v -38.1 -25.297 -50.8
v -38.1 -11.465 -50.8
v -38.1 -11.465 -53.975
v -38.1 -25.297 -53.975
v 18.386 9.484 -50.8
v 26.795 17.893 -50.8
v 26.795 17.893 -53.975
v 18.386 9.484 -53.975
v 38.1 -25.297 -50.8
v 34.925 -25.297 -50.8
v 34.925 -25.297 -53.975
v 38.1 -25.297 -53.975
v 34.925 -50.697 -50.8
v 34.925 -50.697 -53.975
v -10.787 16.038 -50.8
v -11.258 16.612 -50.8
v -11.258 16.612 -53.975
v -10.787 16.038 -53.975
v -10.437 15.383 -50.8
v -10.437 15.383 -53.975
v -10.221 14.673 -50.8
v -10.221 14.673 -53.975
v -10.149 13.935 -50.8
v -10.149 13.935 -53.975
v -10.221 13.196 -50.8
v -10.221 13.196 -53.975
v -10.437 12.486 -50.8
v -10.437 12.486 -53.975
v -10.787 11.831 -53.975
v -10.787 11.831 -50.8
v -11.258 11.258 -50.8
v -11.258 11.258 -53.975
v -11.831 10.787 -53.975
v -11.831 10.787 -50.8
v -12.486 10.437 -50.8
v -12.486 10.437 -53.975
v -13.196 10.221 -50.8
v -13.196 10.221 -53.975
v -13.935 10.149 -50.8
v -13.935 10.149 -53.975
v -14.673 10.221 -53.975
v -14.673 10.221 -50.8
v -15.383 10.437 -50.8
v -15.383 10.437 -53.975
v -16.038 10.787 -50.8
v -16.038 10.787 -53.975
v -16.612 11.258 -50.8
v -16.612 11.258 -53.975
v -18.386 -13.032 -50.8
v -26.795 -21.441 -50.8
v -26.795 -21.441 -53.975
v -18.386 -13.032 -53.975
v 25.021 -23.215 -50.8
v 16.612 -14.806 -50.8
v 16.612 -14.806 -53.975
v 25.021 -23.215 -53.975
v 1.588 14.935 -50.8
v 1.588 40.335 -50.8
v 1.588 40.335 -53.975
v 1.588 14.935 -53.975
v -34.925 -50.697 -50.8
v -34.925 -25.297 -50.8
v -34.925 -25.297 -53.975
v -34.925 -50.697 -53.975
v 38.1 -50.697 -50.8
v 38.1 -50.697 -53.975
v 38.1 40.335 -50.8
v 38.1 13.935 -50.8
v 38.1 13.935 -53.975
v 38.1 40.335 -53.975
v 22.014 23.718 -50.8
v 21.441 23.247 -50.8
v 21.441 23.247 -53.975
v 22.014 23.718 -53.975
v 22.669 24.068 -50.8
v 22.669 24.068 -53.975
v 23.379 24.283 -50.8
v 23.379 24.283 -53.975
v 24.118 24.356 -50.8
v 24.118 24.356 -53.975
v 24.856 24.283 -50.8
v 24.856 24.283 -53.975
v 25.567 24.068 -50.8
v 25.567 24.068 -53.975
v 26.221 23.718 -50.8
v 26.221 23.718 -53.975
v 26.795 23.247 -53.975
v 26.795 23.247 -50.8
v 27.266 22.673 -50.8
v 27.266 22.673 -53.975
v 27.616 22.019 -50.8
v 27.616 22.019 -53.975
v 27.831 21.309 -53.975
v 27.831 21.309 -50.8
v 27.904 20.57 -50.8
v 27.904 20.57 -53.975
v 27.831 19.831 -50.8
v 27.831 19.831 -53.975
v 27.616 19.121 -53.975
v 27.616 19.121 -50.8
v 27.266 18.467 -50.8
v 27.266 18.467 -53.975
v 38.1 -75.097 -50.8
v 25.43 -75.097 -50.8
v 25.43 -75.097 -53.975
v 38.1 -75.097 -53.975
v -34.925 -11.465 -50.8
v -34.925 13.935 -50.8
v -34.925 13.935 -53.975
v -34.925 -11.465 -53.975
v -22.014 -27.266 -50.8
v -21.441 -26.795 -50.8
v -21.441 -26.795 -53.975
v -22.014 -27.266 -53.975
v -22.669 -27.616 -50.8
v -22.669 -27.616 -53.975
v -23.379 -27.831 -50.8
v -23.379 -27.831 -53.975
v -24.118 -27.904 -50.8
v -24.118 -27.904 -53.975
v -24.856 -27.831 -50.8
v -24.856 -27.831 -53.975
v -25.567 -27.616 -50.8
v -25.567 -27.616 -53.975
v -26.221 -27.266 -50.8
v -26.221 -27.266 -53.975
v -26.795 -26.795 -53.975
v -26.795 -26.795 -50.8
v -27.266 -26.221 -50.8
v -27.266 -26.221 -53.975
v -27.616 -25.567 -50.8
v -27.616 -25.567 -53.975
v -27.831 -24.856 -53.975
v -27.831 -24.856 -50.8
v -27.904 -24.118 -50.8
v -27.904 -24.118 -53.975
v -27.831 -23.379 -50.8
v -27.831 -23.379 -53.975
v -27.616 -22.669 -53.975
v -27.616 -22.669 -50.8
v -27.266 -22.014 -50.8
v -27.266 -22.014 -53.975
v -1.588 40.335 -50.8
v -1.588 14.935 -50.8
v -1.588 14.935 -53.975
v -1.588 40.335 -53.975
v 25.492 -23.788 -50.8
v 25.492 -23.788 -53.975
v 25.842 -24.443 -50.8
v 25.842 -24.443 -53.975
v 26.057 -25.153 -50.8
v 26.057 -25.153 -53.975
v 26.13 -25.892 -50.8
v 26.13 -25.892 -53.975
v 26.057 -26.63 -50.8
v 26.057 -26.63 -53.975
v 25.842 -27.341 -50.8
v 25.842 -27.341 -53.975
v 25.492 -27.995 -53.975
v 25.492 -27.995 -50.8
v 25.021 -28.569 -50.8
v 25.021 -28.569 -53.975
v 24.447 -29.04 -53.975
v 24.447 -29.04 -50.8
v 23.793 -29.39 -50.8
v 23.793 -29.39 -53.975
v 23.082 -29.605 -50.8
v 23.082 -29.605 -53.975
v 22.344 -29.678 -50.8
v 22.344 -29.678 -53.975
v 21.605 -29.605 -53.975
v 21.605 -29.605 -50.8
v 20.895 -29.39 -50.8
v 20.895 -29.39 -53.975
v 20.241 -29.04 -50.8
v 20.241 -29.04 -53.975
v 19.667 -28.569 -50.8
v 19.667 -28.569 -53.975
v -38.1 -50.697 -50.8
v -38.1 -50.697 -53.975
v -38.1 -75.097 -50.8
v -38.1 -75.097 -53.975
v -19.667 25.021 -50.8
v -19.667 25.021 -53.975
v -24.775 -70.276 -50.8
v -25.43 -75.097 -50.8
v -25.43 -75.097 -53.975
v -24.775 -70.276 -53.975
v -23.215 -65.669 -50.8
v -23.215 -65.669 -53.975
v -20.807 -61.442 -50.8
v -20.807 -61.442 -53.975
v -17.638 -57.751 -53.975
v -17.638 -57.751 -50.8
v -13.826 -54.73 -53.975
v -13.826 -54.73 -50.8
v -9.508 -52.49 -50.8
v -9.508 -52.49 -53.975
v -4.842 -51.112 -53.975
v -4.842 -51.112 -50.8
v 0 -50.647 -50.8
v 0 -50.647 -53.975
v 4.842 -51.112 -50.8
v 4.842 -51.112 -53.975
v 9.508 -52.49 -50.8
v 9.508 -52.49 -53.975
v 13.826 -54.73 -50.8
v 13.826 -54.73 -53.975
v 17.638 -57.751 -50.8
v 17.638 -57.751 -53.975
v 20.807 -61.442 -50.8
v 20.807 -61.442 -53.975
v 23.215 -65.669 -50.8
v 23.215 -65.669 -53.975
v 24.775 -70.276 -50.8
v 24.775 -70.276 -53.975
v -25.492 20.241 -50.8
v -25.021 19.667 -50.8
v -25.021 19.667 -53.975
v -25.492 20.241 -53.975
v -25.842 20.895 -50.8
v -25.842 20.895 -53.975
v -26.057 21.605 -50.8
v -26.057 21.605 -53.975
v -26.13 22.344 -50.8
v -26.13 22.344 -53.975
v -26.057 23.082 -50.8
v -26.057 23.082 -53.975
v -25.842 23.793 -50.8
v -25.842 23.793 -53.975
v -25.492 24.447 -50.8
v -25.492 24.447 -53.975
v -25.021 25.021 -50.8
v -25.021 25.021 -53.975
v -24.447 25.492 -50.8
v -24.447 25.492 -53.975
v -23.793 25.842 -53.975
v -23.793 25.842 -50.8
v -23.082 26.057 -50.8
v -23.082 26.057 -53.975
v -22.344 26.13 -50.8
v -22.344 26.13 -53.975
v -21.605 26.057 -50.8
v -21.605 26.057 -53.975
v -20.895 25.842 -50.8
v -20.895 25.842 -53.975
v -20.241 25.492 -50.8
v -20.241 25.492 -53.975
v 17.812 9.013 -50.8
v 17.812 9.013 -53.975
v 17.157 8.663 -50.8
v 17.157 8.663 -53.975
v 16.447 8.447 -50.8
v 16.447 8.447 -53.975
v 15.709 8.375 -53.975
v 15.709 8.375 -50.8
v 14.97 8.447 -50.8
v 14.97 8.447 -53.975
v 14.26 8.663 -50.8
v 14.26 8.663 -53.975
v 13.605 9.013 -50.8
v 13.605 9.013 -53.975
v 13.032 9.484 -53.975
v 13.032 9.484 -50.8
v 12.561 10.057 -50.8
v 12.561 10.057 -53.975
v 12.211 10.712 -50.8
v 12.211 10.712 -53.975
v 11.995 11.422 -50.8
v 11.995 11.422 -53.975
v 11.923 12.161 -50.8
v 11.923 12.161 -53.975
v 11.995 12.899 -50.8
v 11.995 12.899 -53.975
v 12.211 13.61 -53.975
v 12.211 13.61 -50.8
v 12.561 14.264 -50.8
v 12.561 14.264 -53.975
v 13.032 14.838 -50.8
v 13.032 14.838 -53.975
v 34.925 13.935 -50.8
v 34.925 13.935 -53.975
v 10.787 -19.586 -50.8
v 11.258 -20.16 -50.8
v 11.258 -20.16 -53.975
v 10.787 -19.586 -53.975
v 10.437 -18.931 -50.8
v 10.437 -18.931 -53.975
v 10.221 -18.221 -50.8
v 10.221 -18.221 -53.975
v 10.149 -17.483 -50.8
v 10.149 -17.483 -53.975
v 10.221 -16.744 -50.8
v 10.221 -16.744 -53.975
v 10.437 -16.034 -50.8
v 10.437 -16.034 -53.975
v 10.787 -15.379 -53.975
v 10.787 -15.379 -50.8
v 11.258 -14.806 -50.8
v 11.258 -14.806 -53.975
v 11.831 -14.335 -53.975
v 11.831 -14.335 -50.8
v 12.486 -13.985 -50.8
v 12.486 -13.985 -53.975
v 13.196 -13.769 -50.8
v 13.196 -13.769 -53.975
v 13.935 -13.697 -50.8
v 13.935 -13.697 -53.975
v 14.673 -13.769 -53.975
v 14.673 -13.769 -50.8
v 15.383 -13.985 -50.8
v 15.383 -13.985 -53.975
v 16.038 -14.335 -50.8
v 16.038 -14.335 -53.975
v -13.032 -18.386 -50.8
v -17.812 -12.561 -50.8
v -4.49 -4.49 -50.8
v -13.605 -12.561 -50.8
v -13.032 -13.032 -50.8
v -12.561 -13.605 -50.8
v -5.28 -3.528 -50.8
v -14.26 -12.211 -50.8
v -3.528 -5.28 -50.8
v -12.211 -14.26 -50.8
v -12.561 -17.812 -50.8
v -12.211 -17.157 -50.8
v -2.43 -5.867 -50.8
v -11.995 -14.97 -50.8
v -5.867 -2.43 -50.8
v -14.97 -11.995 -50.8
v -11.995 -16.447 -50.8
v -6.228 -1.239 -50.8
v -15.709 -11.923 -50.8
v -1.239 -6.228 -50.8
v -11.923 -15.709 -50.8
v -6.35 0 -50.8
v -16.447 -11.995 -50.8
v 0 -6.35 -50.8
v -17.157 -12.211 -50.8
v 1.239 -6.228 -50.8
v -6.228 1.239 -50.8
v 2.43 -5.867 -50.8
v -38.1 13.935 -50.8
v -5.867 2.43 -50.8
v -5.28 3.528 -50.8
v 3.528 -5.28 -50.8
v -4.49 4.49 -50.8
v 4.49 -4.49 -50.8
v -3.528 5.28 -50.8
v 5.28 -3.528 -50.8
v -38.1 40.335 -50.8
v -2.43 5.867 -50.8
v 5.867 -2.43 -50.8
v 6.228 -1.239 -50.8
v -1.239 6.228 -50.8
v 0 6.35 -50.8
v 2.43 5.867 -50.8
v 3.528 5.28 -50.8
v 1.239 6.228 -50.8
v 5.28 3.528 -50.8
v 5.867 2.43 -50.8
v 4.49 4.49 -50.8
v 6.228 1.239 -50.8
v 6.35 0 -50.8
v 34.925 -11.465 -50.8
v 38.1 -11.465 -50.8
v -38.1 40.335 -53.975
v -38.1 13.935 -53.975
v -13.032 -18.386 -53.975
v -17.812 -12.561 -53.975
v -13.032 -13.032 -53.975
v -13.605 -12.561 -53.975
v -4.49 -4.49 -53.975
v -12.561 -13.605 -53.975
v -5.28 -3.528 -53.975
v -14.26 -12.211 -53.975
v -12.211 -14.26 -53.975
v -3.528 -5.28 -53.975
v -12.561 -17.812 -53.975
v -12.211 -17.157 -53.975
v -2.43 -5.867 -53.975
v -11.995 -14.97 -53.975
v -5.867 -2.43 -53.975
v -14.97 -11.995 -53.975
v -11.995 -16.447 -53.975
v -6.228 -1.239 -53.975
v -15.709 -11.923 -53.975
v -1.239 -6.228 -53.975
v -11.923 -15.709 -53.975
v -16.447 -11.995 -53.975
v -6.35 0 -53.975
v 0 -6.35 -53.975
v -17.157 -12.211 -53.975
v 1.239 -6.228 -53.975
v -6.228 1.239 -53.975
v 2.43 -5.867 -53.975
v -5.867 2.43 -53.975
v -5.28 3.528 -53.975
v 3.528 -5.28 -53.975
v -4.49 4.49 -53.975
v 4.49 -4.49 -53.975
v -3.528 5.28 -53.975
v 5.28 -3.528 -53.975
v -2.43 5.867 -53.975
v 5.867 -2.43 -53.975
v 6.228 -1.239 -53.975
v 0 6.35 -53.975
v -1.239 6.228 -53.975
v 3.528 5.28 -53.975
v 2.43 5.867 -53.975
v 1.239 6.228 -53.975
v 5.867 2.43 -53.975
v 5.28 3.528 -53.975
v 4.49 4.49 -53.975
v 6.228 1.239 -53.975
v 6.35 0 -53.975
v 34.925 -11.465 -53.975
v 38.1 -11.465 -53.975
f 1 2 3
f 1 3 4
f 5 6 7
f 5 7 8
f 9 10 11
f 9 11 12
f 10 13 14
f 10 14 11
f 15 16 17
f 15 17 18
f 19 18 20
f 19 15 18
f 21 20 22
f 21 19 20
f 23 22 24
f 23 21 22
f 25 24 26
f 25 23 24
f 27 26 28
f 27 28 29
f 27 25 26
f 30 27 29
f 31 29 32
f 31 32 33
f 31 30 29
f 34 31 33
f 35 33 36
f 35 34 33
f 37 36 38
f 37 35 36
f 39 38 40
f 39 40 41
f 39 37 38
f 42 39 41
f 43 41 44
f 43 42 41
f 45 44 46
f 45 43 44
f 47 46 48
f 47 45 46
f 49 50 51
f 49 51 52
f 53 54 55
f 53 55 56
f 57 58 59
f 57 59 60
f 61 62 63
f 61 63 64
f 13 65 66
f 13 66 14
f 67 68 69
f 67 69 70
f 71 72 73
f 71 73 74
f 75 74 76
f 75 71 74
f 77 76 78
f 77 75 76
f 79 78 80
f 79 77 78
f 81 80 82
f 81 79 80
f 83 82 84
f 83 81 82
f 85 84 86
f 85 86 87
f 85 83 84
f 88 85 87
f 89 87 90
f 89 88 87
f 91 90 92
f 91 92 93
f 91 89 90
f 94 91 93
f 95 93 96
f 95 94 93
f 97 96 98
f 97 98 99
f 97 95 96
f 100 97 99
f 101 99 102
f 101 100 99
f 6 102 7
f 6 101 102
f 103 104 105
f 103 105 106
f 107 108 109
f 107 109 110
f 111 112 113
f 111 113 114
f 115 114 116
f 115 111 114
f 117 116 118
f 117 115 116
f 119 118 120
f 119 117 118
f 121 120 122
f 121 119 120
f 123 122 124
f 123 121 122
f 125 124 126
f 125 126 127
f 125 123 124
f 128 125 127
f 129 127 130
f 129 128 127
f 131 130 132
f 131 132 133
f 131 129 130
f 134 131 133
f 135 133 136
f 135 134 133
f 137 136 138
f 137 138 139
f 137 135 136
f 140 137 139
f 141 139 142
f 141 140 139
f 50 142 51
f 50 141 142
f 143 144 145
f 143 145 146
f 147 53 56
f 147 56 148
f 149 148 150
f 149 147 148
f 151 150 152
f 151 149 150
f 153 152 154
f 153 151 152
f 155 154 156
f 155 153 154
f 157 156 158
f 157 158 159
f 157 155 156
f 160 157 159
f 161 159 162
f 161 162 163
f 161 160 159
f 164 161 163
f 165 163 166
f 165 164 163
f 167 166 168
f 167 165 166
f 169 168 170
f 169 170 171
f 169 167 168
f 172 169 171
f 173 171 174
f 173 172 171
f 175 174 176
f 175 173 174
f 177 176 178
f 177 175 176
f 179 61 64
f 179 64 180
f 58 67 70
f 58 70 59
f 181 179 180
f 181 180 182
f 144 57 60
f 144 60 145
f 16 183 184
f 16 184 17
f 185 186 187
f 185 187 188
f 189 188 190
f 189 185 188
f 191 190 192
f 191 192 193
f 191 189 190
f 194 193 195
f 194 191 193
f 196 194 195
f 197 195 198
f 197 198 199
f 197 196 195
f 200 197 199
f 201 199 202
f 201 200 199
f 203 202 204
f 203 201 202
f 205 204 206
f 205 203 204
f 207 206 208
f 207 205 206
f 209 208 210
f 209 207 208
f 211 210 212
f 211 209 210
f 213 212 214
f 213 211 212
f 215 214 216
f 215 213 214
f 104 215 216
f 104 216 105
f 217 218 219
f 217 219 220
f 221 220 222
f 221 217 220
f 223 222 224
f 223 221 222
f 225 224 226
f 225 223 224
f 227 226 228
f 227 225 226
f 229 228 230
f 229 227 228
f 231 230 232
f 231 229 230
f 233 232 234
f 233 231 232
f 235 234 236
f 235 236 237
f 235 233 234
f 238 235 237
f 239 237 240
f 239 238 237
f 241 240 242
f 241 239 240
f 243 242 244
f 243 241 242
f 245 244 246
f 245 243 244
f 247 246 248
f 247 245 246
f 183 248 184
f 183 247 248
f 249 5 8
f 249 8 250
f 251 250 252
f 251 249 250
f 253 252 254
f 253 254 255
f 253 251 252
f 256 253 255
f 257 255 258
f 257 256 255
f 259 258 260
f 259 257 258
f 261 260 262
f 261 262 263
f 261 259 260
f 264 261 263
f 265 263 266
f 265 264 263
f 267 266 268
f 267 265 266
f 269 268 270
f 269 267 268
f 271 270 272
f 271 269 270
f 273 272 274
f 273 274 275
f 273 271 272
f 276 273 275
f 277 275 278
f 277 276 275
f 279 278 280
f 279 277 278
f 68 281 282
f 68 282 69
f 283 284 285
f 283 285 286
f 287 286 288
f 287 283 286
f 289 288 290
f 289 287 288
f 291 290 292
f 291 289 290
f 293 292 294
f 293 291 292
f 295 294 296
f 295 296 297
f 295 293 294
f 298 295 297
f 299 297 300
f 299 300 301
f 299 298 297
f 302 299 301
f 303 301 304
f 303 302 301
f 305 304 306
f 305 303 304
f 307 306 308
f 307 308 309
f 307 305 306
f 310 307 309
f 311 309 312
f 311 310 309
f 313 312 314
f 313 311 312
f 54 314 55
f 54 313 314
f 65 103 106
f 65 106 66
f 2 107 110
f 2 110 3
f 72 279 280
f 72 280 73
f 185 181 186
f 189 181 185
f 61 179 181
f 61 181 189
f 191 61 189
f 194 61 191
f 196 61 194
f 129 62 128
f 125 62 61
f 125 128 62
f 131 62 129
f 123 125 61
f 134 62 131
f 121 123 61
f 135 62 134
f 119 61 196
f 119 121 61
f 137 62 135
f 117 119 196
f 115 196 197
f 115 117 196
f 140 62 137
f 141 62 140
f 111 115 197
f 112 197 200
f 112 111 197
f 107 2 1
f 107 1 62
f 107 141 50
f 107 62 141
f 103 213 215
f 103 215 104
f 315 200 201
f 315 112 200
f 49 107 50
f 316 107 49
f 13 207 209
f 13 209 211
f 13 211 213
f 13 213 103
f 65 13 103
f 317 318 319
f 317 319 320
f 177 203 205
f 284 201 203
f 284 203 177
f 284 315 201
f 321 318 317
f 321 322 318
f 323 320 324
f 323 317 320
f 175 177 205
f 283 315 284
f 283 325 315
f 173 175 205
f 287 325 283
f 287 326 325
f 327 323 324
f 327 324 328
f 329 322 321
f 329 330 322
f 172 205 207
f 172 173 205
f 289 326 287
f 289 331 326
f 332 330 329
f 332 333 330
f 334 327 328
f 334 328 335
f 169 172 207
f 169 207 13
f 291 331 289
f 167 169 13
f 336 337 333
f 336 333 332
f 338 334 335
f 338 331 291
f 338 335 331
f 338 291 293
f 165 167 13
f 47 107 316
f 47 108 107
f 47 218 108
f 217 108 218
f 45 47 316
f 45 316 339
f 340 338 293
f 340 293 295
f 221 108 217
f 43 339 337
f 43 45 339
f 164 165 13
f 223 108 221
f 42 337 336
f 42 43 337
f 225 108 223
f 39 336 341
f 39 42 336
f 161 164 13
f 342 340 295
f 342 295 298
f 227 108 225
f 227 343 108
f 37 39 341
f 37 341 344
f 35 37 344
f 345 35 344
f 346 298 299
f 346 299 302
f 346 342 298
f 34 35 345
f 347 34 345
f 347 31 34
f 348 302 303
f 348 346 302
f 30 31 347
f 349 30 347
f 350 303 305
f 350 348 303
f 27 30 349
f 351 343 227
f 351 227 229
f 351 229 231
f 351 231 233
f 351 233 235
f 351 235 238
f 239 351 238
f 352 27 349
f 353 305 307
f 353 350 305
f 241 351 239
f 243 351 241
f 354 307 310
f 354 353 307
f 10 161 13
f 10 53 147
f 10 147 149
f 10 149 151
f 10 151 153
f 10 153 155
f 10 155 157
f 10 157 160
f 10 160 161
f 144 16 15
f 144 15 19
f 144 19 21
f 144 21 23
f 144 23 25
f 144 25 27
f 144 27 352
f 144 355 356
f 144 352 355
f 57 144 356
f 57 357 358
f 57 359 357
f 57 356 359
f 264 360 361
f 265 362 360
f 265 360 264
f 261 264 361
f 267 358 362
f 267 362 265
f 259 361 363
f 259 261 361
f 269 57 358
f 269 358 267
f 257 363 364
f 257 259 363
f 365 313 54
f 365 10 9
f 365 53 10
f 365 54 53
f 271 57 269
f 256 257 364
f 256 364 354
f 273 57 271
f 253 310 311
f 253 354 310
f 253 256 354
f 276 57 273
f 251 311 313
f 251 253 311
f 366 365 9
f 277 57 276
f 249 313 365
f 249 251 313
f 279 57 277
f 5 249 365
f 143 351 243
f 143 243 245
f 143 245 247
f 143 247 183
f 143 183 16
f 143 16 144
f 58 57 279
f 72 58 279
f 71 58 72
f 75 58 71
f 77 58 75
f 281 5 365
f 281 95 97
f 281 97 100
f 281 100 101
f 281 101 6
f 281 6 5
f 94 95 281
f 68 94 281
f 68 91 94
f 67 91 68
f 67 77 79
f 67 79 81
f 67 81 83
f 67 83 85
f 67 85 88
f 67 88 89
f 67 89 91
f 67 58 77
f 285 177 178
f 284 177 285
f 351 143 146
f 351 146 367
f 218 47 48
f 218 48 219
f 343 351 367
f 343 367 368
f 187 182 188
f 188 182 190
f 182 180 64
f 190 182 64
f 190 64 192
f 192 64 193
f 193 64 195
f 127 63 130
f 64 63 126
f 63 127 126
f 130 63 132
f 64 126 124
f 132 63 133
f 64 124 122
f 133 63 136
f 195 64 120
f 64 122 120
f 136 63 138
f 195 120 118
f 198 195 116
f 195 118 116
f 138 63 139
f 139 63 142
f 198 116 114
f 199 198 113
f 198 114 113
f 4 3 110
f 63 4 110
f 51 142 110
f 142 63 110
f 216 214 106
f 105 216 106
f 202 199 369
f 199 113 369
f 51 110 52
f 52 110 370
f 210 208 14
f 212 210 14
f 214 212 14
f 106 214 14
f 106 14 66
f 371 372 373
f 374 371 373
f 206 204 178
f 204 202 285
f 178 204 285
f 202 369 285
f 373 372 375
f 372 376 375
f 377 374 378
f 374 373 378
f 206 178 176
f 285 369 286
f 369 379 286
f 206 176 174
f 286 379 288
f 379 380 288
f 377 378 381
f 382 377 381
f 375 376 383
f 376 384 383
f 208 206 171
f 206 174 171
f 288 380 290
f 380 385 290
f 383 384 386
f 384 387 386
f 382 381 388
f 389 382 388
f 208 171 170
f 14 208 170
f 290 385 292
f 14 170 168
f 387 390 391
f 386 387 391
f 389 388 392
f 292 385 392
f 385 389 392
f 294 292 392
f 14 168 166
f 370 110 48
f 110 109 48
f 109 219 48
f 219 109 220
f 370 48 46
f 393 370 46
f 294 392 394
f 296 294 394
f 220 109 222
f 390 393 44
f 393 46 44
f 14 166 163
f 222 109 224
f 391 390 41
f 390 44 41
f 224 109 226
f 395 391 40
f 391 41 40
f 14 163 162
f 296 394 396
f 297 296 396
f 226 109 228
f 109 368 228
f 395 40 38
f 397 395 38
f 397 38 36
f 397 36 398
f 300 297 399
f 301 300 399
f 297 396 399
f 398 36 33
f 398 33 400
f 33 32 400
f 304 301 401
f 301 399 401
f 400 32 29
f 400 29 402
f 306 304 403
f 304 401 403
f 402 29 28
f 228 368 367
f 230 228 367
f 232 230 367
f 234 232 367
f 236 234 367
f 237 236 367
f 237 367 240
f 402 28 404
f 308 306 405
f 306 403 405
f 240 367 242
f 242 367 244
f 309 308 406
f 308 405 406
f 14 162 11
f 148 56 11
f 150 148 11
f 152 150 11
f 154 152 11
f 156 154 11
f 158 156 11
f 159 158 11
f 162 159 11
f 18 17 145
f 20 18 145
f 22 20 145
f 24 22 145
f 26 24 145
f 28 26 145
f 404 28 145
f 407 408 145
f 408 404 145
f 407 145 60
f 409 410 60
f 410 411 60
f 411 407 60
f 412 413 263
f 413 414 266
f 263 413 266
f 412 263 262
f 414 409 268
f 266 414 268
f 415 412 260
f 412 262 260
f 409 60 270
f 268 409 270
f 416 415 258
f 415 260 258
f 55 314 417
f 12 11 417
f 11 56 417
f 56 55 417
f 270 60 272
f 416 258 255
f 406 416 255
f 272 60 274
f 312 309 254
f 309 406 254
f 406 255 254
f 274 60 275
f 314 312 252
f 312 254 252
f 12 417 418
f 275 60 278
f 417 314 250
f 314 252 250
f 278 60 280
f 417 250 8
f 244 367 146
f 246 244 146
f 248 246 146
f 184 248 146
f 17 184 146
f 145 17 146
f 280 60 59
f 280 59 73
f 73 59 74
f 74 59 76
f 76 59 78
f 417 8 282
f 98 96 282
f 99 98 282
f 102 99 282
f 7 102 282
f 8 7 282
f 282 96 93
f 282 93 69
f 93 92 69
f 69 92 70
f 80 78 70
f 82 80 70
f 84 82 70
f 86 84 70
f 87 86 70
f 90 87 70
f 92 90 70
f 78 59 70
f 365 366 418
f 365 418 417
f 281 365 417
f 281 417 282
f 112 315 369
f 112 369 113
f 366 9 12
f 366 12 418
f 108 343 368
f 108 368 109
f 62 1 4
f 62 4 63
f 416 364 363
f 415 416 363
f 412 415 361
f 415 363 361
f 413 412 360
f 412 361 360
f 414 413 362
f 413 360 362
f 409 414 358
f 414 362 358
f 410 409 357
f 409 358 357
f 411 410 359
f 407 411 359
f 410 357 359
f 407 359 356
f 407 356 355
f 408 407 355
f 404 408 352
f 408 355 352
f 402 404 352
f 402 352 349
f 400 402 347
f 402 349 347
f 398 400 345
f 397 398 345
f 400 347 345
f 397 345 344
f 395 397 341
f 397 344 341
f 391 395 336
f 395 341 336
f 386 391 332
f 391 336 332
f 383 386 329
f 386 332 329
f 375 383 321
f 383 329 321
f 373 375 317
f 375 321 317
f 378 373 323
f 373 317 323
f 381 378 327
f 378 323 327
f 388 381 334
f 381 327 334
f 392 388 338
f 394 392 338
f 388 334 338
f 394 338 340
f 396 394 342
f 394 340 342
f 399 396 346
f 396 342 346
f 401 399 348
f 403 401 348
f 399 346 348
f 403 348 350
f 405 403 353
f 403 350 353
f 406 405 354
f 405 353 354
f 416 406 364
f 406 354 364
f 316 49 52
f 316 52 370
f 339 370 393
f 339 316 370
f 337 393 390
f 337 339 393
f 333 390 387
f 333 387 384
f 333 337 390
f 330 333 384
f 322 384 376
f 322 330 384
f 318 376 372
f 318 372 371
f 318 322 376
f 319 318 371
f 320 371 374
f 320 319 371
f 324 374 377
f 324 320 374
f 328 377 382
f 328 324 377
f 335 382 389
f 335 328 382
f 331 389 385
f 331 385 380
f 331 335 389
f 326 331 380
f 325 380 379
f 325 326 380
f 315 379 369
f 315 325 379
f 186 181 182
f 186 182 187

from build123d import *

# Parameters (mm, degrees)
SKETCH9_R           = 6.35
BOSS_EXTRUDE3_DEPTH = 3.175


with BuildPart() as part:
    # Sketch9 → Boss-Extrude3 (new body)
    with BuildSketch(Plane.XY.offset(-50.8)):
        with BuildLine():
            Line((1.5875, 14.934655528), (-1.5875, 14.934655528))
            Line((-1.5875, 14.934655528), (-1.5875, 40.334655528))
            Line((-1.5875, 40.334655528), (-38.1, 40.334655528))
            Line((-38.1, 40.334655528), (-38.1, 13.934655528))
            Line((-38.1, 13.934655528), (-34.925, 13.934655528))
            Line((-34.925, 13.934655528), (-34.925, -11.465344472))
            Line((-34.925, -11.465344472), (-38.1, -11.465344472))
            Line((-38.1, -11.465344472), (-38.1, -25.296741856))
            Line((-38.1, -25.296741856), (-34.925, -25.296741856))
            Line((-34.925, -25.296741856), (-34.925, -50.696741856))
            Line((-34.925, -50.696741856), (-38.1, -50.696741856))
            Line((-38.1, -50.696741856), (-38.1, -75.096741856))
            Line((-38.1, -75.096741856), (-25.429906729, -75.096741856))
            ThreePointArc((-25.429906729, -75.096741856), (0, -50.647180833), (25.429906729, -75.096741856))
            Line((25.429906729, -75.096741856), (38.1, -75.096741856))
            Line((38.1, -75.096741856), (38.1, -50.696741856))
            Line((38.1, -50.696741856), (34.925, -50.696741856))
            Line((34.925, -50.696741856), (34.925, -25.296741856))
            Line((34.925, -25.296741856), (38.1, -25.296741856))
            Line((38.1, -25.296741856), (38.1, -11.465344472))
            Line((38.1, -11.465344472), (34.925, -11.465344472))
            Line((34.925, -11.465344472), (34.925, 13.934655528))
            Line((34.925, 13.934655528), (38.1, 13.934655528))
            Line((38.1, 13.934655528), (38.1, 40.334655528))
            Line((38.1, 40.334655528), (1.5875, 40.334655528))
            Line((1.5875, 40.334655528), (1.5875, 14.934655528))
        make_face()
        with BuildLine():
            ThreePointArc((-21.440764859, -26.794960108), (-26.794960108, -26.794960108), (-26.794960108, -21.440764859))
            Line((-26.794960108, -21.440764859), (-18.385728243, -13.031532993))
            ThreePointArc((-18.385728243, -13.031532993), (-13.031532993, -13.031532993), (-13.031532993, -18.385728243))
            Line((-13.031532993, -18.385728243), (-21.440764859, -26.794960108))
        make_face(mode=Mode.SUBTRACT)
        with BuildLine():
            ThreePointArc((25.020985018, -23.214739949), (25.020985018, -28.568935198), (19.666789768, -28.568935198))
            Line((19.666789768, -28.568935198), (11.257557903, -20.159703333))
            ThreePointArc((11.257557903, -20.159703333), (11.257557903, -14.805508084), (16.611753152, -14.805508084))
            Line((16.611753152, -14.805508084), (25.020985018, -23.214739949))
        make_face(mode=Mode.SUBTRACT)
        with BuildLine():
            ThreePointArc((-25.020985018, 19.666789768), (-25.020985018, 25.020985018), (-19.666789768, 25.020985018))
            Line((-19.666789768, 25.020985018), (-11.257557903, 16.611753152))
            ThreePointArc((-11.257557903, 16.611753152), (-11.257557903, 11.257557903), (-16.611753152, 11.257557903))
            Line((-16.611753152, 11.257557903), (-25.020985018, 19.666789768))
        make_face(mode=Mode.SUBTRACT)
        Circle(SKETCH9_R, mode=Mode.SUBTRACT)
        with BuildLine():
            ThreePointArc((21.440764859, 23.247009927), (26.794960108, 23.247009927), (26.794960108, 17.892814678))
            Line((26.794960108, 17.892814678), (18.385728243, 9.483582813))
            ThreePointArc((18.385728243, 9.483582813), (13.031532993, 9.483582813), (13.031532993, 14.837778062))
            Line((13.031532993, 14.837778062), (21.440764859, 23.247009927))
        make_face(mode=Mode.SUBTRACT)
    extrude(amount=-BOSS_EXTRUDE3_DEPTH)


solid = part.part
